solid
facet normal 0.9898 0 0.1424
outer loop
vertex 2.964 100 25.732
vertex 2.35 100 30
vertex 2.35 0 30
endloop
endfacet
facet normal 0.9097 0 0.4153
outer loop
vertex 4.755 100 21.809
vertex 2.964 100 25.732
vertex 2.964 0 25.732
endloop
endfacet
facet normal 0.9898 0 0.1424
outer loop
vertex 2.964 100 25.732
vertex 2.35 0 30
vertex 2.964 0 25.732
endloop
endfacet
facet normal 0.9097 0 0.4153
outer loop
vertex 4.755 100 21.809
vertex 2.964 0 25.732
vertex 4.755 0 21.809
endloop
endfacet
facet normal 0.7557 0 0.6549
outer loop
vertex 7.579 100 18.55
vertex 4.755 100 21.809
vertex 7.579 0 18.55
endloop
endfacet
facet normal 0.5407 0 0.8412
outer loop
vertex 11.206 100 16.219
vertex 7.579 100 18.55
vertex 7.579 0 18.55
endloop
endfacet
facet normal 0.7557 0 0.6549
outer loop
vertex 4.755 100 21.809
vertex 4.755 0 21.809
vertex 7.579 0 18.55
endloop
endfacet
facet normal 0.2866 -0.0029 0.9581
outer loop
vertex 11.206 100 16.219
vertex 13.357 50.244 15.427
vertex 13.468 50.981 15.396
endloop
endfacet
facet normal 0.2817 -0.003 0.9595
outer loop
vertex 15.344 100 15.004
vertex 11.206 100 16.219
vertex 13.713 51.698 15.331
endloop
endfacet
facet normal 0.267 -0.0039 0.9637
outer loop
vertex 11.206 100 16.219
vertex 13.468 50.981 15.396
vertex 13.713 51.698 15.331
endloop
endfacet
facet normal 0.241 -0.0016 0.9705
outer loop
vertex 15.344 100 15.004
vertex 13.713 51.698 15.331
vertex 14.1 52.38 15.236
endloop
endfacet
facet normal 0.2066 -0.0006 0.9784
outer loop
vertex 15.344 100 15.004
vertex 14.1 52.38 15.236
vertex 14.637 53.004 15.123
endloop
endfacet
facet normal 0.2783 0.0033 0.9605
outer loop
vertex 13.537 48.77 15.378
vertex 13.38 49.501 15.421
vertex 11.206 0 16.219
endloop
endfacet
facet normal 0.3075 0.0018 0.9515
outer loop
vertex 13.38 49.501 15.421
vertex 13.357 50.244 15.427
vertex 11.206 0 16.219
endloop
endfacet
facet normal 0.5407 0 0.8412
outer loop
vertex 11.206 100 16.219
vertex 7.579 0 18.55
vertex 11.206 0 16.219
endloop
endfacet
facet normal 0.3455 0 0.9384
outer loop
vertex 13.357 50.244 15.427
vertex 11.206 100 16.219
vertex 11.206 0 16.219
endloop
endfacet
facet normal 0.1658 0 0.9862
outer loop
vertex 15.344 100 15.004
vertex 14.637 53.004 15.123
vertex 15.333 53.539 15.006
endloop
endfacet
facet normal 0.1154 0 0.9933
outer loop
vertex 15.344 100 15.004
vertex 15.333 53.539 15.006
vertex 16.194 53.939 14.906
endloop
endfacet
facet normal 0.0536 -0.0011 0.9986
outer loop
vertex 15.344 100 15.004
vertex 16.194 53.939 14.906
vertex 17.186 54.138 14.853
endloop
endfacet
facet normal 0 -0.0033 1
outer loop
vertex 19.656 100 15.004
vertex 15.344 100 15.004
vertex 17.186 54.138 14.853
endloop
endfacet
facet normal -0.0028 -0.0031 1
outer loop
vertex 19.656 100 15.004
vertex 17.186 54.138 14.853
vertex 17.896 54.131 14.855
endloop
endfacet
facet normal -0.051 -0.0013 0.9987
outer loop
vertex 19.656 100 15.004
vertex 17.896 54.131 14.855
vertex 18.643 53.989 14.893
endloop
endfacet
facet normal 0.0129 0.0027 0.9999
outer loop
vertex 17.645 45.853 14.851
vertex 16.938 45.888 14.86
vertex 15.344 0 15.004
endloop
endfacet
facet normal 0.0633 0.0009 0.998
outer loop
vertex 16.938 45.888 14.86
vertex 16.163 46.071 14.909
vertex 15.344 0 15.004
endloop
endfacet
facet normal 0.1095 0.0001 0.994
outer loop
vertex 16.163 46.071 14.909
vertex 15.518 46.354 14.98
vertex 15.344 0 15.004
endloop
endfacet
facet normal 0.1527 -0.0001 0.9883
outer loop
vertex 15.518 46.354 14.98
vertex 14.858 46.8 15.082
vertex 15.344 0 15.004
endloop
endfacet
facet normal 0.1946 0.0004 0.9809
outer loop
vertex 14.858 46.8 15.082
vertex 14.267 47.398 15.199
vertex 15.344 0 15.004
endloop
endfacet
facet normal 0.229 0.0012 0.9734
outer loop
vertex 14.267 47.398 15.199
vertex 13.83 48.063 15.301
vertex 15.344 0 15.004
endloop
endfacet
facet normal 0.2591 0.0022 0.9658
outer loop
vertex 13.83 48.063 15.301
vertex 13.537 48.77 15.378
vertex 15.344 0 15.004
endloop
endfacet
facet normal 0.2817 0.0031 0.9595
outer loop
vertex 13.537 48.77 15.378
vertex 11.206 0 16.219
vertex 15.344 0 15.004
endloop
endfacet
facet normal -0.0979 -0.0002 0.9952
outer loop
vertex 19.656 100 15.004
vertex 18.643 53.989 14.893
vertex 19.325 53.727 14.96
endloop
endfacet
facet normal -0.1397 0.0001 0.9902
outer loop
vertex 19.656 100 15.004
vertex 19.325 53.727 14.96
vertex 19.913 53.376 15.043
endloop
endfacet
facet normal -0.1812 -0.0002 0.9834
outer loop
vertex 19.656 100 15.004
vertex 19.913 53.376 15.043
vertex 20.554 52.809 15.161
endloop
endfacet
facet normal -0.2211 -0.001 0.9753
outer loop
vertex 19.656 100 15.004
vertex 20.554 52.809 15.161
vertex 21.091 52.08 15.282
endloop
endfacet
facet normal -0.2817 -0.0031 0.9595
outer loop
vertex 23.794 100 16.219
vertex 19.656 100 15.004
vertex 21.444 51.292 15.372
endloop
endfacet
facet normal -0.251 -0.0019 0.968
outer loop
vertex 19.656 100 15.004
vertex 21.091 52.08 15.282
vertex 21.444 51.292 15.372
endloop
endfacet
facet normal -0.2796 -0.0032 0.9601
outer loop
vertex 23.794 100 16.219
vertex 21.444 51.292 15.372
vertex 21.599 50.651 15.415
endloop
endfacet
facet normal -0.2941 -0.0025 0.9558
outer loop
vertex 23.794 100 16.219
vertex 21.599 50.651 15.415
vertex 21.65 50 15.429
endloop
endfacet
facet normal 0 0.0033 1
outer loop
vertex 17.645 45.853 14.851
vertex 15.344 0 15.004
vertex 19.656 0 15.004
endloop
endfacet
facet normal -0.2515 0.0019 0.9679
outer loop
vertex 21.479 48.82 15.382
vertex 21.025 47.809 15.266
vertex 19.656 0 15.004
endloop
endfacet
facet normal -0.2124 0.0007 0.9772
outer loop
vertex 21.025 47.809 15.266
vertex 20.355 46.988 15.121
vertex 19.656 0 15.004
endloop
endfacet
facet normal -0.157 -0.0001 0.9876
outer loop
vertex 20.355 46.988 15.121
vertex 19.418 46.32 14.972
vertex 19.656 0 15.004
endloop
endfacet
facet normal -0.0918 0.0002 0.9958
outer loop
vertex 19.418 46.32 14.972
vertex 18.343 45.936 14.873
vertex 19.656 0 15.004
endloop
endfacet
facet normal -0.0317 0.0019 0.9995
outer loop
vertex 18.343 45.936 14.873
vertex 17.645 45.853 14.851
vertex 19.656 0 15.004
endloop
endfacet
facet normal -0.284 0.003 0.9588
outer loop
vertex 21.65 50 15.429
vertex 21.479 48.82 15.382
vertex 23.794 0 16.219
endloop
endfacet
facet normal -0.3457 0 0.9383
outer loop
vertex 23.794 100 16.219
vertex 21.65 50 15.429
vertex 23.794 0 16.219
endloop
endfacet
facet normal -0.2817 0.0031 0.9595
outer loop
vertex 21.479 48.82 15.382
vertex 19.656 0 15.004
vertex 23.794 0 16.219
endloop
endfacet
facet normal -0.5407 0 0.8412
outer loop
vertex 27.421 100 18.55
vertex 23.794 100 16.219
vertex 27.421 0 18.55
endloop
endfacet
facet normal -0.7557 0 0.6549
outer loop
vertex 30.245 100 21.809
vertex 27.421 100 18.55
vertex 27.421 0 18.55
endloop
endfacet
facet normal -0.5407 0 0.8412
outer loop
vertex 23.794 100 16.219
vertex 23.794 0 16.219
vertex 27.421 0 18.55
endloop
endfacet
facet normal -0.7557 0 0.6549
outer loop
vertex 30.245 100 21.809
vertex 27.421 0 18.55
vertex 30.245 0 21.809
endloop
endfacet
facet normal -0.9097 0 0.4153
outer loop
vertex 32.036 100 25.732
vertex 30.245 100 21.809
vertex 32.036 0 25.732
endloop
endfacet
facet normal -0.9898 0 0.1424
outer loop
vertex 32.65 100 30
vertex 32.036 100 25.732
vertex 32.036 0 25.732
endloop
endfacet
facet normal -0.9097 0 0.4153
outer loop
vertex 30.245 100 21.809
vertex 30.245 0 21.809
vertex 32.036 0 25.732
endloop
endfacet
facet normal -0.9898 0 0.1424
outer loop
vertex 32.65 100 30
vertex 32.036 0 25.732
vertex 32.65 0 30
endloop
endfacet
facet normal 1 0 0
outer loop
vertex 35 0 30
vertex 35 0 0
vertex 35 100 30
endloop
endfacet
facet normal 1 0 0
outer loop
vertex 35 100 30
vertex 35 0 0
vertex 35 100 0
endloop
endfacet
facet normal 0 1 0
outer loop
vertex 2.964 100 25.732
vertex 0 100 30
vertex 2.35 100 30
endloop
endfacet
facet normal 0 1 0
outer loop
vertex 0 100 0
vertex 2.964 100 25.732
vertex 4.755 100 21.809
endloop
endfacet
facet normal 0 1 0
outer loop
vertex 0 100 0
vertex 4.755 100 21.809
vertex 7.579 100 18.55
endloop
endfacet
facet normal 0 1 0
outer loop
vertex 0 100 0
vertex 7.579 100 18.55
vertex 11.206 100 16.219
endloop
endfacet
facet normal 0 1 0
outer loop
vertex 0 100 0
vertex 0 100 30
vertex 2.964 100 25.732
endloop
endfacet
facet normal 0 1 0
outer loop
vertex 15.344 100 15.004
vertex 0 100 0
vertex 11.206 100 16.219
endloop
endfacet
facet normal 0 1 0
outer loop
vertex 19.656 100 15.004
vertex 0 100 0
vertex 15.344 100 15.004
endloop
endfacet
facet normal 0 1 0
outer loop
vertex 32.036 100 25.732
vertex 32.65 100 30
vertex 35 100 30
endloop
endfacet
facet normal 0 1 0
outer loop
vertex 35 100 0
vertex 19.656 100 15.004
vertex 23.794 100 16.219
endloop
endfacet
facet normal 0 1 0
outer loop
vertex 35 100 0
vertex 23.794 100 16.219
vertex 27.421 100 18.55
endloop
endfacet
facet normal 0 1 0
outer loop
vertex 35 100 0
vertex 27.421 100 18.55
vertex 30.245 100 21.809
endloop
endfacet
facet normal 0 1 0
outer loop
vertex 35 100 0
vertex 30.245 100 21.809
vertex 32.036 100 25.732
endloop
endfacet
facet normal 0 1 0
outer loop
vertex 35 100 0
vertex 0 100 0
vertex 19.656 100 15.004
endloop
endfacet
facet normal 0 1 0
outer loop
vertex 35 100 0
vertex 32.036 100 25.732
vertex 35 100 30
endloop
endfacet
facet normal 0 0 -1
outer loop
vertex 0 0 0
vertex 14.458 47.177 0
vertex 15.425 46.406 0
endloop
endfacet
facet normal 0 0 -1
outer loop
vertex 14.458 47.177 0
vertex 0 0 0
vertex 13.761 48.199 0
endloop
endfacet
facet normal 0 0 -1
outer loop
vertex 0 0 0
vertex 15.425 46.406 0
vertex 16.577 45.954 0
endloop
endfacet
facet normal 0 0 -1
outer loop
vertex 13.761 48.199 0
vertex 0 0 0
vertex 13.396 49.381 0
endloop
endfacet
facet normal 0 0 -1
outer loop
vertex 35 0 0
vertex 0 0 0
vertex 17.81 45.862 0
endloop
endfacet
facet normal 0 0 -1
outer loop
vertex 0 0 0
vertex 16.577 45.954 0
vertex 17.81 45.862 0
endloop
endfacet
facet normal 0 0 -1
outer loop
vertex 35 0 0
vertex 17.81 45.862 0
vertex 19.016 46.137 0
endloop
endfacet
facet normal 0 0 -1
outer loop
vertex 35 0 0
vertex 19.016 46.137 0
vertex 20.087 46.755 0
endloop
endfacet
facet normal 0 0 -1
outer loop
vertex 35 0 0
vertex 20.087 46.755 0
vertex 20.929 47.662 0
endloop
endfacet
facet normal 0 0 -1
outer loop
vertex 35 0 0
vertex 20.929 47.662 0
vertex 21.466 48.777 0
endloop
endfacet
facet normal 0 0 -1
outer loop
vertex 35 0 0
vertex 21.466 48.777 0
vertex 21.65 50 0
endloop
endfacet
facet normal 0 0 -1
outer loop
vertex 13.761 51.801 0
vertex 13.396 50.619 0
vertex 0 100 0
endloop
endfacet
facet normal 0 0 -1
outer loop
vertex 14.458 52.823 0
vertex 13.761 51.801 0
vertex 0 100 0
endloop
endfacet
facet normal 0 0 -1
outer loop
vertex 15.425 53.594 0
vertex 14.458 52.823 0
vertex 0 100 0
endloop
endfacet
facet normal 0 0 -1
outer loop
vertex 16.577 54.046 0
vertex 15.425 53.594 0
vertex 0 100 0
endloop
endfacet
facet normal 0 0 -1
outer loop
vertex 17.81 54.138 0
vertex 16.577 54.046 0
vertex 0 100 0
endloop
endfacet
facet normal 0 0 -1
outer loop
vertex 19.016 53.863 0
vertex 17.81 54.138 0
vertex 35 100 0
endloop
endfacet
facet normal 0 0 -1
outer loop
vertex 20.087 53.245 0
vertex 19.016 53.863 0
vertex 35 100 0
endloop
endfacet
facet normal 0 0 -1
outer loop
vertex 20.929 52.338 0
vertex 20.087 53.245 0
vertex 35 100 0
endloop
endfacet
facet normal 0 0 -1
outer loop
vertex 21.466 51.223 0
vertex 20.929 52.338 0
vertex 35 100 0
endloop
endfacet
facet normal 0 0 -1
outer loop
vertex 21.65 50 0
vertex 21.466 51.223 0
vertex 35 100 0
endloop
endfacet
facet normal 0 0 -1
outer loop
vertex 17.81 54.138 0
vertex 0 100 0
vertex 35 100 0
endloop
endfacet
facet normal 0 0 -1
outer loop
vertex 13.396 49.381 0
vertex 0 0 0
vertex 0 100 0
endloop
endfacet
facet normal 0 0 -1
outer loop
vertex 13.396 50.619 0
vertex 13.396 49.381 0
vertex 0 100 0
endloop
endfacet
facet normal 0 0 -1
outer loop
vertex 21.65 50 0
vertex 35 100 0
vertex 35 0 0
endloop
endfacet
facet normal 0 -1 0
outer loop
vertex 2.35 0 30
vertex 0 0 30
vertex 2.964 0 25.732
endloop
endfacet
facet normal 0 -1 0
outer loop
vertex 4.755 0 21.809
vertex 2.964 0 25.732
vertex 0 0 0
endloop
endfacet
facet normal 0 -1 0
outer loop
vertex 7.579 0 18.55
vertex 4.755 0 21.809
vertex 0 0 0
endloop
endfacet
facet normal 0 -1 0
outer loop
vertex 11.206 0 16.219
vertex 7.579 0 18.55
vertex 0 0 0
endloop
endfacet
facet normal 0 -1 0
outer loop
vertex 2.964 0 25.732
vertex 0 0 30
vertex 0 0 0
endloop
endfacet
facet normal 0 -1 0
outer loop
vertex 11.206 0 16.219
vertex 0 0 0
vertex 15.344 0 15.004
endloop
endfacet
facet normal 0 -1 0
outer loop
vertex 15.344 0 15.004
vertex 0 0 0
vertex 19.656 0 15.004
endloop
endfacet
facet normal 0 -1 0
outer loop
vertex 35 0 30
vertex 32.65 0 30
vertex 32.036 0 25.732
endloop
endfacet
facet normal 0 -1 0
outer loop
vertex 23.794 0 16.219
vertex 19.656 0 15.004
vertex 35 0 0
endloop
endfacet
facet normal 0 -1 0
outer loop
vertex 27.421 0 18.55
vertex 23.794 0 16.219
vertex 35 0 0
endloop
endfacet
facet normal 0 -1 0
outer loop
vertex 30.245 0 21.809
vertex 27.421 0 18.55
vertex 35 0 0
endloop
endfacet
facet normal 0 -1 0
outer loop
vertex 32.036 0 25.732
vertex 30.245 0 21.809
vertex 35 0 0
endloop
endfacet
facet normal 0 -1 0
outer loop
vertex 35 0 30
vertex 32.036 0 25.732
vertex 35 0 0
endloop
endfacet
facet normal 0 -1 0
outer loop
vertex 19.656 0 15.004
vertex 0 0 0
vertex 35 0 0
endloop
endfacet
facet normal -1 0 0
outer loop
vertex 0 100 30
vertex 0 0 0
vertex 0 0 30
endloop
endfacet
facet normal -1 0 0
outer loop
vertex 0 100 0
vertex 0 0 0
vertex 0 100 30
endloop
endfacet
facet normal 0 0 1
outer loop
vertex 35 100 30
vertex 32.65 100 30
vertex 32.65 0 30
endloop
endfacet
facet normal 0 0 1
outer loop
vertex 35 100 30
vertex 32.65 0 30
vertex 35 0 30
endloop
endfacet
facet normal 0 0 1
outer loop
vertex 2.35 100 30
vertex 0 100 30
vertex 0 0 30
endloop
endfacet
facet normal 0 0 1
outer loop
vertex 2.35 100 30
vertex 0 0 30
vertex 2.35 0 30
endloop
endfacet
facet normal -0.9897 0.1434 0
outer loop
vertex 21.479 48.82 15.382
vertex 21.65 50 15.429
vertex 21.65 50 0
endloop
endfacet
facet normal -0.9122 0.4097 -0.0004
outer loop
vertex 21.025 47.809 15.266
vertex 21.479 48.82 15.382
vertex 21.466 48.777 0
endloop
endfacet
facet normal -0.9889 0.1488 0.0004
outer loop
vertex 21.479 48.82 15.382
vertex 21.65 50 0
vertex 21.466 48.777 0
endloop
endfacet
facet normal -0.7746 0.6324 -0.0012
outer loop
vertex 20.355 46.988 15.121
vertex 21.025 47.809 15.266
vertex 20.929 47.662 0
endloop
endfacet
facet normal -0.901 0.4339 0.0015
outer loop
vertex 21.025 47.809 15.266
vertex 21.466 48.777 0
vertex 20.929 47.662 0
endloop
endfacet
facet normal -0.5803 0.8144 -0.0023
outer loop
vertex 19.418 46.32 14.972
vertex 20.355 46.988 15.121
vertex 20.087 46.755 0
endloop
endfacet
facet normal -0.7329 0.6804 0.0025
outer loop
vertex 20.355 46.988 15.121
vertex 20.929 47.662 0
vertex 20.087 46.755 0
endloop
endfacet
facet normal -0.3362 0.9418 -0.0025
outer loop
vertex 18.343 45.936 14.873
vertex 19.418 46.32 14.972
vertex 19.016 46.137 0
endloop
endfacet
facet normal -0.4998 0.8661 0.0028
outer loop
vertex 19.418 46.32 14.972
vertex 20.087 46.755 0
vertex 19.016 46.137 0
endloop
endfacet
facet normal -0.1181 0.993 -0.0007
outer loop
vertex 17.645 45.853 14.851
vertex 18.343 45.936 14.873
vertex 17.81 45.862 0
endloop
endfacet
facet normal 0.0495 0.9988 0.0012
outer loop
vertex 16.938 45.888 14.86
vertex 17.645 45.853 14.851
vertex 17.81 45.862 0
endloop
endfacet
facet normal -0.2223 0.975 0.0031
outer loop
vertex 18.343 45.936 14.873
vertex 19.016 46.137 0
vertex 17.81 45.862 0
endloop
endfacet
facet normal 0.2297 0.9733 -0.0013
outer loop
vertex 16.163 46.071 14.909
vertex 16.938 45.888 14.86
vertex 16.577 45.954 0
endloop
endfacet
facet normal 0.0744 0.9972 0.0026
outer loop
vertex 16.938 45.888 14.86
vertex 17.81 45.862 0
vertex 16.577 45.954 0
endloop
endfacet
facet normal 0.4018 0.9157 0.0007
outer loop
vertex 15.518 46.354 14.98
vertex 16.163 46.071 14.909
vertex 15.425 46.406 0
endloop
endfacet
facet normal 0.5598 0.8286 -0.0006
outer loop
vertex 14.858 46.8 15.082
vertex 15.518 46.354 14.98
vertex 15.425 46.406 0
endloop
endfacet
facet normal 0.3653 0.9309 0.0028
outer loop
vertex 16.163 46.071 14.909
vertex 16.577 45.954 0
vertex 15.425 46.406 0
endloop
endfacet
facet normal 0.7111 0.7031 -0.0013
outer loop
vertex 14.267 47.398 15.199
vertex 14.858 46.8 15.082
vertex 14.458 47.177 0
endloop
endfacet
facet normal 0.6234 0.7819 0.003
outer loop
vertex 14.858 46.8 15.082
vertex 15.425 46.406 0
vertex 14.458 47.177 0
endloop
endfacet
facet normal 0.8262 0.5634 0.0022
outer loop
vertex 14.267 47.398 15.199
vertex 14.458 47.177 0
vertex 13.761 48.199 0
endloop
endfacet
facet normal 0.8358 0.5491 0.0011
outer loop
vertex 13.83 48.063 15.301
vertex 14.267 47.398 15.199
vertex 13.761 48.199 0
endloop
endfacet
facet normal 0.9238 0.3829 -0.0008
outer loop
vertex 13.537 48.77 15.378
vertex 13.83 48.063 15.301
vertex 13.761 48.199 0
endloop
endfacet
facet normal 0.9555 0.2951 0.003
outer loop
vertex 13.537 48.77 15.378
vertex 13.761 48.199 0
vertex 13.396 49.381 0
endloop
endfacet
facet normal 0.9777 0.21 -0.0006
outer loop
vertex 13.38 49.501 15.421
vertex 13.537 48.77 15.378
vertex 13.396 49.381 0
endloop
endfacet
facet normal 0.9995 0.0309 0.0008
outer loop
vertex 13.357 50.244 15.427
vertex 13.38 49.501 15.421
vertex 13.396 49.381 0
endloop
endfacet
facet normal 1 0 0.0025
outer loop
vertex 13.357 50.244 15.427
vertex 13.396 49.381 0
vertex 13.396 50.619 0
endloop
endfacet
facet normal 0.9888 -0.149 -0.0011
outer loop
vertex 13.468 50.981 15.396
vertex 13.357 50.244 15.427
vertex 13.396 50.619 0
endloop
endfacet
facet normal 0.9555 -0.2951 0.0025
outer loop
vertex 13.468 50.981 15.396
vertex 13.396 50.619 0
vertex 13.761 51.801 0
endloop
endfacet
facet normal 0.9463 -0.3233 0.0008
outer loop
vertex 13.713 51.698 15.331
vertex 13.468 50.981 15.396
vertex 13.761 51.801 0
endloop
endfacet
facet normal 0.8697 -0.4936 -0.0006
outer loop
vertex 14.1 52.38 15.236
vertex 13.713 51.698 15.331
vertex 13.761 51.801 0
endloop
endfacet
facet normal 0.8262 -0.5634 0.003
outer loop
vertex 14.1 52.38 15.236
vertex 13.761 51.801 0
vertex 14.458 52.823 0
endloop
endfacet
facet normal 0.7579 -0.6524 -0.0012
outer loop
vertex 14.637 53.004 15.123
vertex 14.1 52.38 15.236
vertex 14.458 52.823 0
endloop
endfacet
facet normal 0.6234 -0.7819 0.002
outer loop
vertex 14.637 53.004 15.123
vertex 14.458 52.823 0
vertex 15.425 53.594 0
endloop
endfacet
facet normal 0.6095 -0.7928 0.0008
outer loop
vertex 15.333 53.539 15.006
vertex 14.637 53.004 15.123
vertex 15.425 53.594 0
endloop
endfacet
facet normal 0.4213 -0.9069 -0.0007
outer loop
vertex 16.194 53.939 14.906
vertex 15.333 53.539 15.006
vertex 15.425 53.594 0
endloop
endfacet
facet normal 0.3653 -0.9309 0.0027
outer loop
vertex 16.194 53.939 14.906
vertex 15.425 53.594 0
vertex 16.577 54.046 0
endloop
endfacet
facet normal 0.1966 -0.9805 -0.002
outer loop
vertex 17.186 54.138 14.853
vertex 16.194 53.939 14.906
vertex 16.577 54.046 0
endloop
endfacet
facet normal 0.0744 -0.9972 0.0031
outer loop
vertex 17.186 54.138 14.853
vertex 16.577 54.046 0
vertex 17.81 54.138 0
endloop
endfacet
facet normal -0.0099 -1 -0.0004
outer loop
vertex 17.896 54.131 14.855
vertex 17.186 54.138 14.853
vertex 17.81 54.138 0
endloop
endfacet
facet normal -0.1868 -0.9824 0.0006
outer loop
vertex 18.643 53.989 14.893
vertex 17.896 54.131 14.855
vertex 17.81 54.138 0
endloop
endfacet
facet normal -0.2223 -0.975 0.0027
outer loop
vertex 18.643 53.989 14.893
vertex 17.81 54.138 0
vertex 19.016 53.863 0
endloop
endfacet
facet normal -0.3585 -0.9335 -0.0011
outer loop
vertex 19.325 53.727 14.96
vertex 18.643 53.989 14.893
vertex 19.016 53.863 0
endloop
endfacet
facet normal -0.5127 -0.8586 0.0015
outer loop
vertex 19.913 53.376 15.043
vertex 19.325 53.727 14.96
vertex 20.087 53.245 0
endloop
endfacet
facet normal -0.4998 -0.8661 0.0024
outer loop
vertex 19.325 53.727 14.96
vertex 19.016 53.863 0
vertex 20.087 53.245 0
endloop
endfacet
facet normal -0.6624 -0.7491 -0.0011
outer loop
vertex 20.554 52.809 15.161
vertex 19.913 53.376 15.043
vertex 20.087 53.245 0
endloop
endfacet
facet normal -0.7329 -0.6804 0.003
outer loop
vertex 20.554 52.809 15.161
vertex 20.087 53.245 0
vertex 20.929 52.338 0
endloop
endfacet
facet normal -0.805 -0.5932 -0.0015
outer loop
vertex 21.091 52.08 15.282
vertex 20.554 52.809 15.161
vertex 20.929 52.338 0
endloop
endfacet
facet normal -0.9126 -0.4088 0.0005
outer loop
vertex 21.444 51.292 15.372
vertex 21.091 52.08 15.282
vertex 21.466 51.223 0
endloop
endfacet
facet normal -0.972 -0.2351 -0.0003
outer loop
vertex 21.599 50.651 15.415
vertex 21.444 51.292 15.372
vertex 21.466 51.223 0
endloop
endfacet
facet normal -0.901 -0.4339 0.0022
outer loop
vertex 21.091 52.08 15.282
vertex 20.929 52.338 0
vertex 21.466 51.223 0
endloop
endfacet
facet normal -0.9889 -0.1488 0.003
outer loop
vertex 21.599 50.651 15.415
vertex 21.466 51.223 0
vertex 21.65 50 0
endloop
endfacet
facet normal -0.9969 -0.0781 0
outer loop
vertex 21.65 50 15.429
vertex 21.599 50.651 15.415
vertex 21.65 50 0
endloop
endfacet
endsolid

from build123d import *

# Parameters (mm, degrees)
F0_W     = 35
F0_H     = 100
F1_DEPTH = 30
F2_R     = 15.15
F3_DEPTH = 999
F4_R     = 4.15
F5_DEPTH = 25


with BuildPart() as f1:
    # F0 (on Top) → F1 (new body)
    with BuildSketch(Plane.XY):
        with Locations((17.5, 50)):
            Rectangle(F0_W, F0_H)
    extrude(amount=F1_DEPTH)

    # F2 (on face) → F3 (cut)
    with BuildSketch(Plane.XZ):
        with Locations((17.5, 30)):
            Circle(F2_R)
    extrude(amount=-F3_DEPTH, mode=Mode.SUBTRACT)

    # F4 (on face) → F5 (cut)
    with BuildSketch(Plane(origin=(0, 0, 0), x_dir=(1, 0, 0), z_dir=(0, 0, -1))):
        with Locations((17.5, -50)):
            Circle(F4_R)
    extrude(amount=-F5_DEPTH, mode=Mode.SUBTRACT)


solid = f1.part
